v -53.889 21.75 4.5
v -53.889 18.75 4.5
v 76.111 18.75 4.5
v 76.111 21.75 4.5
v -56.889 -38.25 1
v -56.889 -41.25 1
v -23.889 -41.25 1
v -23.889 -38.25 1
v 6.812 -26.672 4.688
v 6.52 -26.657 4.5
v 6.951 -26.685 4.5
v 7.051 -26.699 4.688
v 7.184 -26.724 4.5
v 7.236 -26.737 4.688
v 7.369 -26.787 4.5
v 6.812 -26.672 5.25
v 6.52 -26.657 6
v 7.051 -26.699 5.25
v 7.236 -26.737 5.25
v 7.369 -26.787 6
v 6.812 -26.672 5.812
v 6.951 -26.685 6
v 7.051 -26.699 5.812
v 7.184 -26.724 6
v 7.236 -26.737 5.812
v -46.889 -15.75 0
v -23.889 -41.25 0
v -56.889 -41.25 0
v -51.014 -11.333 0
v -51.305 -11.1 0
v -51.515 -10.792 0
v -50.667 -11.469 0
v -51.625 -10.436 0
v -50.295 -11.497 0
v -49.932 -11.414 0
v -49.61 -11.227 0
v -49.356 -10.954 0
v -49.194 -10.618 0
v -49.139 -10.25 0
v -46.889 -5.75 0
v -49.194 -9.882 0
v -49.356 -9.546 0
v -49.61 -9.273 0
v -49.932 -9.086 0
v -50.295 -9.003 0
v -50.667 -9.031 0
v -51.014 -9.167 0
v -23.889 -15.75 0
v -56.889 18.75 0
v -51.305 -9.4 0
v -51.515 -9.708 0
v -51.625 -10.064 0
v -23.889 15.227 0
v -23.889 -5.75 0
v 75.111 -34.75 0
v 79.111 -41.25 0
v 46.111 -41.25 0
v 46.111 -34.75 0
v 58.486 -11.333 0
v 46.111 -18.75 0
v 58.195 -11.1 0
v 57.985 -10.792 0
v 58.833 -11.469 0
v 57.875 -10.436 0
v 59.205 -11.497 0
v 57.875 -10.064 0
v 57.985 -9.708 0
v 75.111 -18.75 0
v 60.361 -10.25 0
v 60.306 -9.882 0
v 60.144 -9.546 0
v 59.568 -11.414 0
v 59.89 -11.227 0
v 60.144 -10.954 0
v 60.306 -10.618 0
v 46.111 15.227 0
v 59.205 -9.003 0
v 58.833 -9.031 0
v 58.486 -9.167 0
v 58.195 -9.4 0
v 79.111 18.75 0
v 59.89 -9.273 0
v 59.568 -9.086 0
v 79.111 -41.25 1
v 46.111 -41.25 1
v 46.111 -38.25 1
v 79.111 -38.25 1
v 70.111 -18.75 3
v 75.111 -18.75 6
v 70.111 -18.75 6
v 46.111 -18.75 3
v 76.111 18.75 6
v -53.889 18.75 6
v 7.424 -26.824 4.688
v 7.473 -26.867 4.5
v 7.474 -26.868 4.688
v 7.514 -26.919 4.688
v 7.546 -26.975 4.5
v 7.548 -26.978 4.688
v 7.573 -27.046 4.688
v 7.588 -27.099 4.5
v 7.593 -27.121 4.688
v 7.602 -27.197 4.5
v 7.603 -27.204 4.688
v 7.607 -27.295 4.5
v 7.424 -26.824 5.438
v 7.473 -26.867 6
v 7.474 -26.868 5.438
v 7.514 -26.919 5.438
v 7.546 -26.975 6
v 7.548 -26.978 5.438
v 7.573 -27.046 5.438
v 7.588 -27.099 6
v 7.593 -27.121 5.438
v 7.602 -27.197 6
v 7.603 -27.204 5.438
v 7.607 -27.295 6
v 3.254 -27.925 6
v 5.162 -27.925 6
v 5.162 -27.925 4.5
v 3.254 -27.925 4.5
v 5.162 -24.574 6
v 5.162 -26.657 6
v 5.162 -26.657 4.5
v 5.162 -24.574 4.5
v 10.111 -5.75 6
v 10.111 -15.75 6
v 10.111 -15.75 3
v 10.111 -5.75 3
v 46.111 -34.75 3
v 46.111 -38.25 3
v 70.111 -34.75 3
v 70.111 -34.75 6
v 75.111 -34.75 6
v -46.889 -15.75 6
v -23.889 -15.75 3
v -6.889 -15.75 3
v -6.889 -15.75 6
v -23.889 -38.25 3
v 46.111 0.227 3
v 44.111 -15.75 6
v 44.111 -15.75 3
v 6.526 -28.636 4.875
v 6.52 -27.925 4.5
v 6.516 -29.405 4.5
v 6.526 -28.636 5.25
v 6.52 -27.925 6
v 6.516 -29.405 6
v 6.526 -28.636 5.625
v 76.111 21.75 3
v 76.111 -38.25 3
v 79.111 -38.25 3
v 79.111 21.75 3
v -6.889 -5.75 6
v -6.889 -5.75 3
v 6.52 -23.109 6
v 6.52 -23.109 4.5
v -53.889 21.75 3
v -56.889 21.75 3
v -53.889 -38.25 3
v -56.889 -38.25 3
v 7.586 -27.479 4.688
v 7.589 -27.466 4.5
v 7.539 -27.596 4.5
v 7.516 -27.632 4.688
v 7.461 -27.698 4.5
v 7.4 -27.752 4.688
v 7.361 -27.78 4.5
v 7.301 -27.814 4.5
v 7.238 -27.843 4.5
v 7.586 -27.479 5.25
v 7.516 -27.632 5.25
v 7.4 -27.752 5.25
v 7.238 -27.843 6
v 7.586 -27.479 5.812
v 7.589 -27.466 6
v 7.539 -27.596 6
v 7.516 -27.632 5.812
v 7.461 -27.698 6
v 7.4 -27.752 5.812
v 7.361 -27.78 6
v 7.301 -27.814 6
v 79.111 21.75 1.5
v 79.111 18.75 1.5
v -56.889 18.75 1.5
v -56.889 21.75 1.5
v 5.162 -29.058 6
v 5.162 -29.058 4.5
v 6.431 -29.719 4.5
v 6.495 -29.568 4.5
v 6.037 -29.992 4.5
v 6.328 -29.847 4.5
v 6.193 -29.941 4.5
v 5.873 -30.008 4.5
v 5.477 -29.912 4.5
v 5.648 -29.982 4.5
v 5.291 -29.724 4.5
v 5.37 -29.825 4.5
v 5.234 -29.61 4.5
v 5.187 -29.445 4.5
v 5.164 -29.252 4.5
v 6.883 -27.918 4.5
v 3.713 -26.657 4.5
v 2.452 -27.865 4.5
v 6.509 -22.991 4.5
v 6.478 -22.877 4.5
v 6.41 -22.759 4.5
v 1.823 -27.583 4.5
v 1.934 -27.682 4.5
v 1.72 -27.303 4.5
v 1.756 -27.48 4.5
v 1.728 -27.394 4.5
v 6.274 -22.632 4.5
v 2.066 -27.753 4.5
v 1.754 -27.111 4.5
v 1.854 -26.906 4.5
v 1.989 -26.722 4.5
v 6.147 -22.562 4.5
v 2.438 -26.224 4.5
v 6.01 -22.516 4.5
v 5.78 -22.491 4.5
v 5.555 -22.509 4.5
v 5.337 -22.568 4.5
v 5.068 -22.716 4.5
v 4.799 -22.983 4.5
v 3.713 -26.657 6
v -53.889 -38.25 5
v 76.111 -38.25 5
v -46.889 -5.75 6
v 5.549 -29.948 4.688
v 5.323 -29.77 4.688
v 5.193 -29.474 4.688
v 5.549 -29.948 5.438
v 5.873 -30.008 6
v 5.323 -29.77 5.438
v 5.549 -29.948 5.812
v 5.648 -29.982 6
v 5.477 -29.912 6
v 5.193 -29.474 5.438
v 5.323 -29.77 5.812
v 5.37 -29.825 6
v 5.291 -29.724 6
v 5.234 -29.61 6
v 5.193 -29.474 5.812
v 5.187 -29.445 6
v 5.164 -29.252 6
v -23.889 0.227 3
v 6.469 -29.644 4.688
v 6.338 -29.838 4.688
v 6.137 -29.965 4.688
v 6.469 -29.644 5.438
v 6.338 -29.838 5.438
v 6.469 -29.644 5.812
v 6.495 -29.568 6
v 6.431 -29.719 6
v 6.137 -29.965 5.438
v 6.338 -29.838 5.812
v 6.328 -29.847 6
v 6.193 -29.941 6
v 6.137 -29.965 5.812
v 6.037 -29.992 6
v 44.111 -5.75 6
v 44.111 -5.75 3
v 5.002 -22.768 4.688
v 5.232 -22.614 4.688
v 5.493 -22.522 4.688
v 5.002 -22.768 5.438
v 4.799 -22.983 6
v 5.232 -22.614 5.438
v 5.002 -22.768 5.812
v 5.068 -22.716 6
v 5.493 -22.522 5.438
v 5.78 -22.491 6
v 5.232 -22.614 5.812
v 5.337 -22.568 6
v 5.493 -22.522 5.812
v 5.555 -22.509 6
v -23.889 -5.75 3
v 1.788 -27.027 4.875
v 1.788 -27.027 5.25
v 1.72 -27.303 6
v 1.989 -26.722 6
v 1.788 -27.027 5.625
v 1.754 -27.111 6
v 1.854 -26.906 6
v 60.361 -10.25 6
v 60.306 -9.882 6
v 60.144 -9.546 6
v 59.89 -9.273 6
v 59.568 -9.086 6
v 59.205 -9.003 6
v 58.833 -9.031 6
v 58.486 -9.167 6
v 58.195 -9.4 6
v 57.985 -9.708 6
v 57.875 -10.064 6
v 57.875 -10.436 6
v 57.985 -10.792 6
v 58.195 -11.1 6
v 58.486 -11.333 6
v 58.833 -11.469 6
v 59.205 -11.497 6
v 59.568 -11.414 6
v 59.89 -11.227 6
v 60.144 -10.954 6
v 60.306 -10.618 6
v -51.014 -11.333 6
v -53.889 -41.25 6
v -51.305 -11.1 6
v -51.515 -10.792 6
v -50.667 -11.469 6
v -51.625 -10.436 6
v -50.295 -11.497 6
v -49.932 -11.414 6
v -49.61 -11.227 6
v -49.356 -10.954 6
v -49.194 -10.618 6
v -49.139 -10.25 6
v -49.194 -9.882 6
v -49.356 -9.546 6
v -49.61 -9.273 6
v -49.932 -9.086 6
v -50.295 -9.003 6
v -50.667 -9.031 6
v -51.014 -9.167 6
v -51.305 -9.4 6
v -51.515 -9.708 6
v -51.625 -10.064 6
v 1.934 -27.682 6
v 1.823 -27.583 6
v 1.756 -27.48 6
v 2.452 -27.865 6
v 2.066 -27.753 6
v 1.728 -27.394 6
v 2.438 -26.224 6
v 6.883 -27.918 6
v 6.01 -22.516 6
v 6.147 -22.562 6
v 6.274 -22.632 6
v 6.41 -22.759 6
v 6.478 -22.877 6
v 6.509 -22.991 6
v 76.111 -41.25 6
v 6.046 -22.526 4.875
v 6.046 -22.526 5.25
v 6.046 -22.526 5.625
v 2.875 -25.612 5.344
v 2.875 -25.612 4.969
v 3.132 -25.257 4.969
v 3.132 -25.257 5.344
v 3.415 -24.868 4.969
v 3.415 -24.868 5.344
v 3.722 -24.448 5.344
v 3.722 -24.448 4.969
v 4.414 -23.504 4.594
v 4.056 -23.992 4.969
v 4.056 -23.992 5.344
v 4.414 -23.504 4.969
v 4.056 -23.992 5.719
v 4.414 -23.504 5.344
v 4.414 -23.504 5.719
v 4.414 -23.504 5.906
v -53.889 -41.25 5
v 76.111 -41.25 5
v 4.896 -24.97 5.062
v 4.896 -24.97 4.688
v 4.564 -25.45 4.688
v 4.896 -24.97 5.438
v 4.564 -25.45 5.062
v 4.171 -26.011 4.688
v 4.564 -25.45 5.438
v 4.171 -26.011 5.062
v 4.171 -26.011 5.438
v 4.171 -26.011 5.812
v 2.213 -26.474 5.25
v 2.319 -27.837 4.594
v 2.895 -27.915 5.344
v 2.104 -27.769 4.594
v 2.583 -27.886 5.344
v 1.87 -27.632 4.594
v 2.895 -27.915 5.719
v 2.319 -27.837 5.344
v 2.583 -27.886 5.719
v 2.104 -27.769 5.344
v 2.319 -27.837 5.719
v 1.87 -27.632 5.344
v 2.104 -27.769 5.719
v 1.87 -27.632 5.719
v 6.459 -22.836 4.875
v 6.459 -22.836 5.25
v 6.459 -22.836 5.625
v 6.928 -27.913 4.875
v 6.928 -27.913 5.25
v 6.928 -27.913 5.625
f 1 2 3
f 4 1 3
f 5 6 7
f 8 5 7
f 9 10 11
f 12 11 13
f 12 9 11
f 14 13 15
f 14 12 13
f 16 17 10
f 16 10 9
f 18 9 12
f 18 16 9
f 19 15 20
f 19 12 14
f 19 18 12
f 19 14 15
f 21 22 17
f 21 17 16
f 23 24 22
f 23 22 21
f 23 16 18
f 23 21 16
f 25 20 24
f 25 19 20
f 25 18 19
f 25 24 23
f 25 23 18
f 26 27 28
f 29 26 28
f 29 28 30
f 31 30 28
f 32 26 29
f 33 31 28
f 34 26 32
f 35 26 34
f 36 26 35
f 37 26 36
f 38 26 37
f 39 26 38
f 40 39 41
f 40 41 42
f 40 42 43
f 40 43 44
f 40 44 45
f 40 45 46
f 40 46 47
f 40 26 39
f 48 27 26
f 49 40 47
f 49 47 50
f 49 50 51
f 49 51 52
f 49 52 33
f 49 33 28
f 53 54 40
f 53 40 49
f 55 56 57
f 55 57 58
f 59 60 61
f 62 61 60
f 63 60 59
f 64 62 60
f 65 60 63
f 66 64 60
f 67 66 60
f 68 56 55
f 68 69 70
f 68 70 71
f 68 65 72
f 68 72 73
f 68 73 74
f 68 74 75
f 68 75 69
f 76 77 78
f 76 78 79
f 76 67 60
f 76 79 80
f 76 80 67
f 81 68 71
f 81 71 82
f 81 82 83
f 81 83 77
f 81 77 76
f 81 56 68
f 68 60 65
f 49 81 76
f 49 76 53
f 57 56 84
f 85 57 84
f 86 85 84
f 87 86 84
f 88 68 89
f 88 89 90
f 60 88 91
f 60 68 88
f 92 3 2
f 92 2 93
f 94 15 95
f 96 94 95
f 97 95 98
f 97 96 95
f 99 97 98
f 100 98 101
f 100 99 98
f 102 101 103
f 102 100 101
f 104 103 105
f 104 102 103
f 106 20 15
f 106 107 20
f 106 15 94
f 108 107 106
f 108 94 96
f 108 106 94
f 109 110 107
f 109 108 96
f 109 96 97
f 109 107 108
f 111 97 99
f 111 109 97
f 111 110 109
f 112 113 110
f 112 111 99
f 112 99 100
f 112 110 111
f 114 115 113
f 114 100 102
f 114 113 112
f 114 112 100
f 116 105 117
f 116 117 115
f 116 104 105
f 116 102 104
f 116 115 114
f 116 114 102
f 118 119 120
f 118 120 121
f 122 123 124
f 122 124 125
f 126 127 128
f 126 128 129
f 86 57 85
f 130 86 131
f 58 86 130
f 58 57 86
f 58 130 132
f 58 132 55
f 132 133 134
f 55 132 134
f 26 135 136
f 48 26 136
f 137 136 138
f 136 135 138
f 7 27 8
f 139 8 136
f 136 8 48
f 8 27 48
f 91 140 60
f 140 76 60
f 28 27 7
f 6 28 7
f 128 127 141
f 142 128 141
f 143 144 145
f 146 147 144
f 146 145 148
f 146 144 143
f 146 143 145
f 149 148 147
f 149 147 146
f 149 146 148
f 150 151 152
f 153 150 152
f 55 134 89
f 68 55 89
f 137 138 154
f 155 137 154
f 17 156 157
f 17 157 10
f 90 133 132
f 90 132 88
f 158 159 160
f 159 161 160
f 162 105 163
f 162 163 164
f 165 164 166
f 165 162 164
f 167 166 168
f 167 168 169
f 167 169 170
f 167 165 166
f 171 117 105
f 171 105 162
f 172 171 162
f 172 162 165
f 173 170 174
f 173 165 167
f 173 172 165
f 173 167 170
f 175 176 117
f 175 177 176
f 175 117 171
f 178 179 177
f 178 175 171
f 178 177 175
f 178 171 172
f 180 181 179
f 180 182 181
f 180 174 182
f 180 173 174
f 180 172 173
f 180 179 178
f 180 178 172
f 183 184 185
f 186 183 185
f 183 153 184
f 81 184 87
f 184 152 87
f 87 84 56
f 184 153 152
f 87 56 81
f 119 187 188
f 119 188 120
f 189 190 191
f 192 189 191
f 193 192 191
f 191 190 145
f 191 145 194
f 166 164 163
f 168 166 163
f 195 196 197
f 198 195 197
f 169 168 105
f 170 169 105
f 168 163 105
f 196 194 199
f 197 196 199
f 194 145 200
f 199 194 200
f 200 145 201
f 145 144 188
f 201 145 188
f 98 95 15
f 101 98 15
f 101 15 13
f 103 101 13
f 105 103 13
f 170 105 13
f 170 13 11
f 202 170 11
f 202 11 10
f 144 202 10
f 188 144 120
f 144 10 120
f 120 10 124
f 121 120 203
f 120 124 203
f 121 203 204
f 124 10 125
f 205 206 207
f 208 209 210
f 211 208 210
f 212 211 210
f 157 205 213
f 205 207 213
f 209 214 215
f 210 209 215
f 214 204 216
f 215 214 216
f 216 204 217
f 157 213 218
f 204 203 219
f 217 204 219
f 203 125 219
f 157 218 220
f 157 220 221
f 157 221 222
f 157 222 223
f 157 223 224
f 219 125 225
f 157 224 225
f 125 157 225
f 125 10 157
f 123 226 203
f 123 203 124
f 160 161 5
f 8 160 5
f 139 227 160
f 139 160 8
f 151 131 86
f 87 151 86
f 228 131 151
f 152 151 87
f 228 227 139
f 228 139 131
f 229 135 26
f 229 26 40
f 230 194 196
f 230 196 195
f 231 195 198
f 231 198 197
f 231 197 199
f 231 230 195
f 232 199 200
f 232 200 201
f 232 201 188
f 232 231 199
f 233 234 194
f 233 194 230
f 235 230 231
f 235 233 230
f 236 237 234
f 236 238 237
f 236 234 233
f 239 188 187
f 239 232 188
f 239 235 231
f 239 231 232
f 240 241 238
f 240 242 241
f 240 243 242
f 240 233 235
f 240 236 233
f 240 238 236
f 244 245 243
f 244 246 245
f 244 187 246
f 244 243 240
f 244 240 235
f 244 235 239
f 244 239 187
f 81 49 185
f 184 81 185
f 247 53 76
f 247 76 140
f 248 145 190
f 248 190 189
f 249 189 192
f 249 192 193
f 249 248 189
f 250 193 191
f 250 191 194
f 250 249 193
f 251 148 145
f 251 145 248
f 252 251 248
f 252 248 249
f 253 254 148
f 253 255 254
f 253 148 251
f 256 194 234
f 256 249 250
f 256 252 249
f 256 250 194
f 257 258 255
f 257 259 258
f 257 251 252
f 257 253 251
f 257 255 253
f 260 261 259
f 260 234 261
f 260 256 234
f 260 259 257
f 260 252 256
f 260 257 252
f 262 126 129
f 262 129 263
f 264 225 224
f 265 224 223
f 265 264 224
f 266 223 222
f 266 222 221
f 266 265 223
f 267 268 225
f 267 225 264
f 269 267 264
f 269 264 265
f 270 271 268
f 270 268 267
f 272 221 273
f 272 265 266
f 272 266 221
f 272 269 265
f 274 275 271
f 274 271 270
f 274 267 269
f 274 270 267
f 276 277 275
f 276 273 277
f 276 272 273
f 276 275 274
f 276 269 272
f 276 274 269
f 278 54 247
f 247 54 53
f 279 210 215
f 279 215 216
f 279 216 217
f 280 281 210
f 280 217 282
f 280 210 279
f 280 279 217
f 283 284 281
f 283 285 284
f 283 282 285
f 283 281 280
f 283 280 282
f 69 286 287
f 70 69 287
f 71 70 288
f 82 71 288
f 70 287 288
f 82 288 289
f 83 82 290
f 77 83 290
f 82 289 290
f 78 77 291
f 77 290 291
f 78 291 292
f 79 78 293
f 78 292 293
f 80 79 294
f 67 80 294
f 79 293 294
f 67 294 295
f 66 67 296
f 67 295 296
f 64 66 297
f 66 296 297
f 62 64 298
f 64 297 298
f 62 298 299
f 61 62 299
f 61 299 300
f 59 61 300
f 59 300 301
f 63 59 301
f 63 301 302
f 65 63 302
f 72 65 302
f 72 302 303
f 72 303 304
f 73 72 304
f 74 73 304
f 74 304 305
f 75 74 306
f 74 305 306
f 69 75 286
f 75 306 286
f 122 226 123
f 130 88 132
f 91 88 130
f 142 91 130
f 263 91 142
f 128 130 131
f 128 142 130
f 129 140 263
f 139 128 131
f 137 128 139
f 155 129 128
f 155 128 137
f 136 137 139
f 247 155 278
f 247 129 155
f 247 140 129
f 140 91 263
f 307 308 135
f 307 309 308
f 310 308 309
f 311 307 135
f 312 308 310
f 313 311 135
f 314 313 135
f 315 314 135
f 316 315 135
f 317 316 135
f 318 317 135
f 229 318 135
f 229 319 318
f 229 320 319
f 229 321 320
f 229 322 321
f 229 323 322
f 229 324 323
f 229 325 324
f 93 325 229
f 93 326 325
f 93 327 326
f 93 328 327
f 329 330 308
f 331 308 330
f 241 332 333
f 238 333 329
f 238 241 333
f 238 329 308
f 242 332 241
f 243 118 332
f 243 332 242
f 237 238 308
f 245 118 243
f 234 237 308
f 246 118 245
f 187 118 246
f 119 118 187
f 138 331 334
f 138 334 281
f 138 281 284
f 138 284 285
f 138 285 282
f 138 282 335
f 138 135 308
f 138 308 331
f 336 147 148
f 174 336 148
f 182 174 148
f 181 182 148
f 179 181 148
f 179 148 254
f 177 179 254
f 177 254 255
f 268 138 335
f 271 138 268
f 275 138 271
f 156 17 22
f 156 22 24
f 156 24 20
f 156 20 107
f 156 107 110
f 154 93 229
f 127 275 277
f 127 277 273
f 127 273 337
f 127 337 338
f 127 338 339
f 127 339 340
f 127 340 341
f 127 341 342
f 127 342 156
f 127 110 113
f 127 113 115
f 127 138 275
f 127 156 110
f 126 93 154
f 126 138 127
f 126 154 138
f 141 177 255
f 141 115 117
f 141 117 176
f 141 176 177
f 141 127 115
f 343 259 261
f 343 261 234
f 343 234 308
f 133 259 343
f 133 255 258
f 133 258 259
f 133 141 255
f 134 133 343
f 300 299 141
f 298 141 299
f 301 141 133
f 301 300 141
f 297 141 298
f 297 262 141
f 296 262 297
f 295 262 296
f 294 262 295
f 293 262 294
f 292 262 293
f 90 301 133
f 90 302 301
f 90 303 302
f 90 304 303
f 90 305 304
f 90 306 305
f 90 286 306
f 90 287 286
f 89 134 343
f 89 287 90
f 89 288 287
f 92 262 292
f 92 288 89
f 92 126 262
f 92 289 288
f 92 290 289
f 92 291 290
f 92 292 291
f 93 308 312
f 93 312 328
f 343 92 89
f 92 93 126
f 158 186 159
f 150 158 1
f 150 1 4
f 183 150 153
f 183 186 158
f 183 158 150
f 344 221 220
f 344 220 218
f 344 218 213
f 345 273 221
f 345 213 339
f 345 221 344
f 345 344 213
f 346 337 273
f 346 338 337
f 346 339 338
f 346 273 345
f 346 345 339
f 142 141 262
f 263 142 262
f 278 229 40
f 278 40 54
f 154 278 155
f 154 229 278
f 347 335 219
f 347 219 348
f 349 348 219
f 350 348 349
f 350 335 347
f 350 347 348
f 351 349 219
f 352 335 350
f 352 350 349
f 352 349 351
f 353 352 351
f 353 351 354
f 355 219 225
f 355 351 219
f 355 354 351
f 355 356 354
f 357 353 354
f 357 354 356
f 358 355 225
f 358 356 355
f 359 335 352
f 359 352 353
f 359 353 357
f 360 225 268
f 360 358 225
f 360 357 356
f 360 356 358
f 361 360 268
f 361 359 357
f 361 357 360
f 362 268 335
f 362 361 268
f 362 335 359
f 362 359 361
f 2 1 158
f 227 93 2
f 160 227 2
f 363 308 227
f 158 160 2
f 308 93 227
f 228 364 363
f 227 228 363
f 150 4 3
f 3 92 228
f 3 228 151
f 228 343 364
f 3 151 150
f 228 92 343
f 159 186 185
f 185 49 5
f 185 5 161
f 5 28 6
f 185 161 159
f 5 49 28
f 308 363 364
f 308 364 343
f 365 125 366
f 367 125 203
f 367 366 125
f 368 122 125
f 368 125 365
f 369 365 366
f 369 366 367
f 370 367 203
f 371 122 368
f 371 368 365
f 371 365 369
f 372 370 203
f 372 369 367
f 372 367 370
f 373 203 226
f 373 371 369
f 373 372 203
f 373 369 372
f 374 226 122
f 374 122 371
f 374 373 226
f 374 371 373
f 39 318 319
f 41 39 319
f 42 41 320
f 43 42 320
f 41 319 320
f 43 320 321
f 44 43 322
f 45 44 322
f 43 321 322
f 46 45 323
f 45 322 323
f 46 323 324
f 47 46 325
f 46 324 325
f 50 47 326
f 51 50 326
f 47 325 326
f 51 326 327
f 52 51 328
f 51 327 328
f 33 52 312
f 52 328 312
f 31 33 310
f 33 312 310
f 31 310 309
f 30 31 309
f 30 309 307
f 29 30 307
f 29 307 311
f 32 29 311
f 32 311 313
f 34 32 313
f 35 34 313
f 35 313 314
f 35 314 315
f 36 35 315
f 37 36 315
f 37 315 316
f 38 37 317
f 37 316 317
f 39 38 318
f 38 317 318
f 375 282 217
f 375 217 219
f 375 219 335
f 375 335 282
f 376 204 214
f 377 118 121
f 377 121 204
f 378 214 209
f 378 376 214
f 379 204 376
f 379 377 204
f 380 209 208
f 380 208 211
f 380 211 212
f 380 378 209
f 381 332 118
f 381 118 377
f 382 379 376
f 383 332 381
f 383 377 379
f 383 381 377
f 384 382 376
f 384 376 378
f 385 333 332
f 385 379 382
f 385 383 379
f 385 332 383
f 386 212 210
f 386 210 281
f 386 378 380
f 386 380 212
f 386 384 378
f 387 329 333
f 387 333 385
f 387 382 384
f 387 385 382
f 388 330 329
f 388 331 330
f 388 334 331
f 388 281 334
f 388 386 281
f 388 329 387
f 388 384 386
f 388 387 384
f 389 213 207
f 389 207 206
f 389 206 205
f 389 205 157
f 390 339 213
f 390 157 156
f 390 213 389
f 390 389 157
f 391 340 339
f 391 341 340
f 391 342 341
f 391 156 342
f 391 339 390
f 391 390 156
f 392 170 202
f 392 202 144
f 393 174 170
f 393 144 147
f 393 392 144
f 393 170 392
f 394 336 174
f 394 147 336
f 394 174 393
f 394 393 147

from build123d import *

# Parameters (mm, degrees)
SKETCH_1_W           = 130
SKETCH_1_H           = 60
EXTRUDE_1_DEPTH      = 6
EXTRUDE_2_DEPTH      = 3
EXTRUDE_2_DEPTH_BACK = 133
SKETCH_2_W           = 3
SKETCH_2_H           = 60
SKETCH_3_R           = 1.25
SKETCH_3_W           = 5
SKETCH_3_H           = 16
SKETCH_3_W_2         = 40
SKETCH_3_H_2         = 10
SKETCH_3_W_3         = 34
CUT_EXTRUDE_1_DEPTH  = 6
CUT_EXTRUDE_2_DEPTH  = 1.5
SKETCH_5_W           = 70
SKETCH_5_H           = 41.476582403
SKETCH_5_W_2         = 24
SKETCH_5_H_2         = 16
CUT_EXTRUDE_3_DEPTH  = 3
CHAMFER_1_SIZE       = 15
CHAMFER_1_SIZE_2     = 3
CUT_EXTRUDE_4_DEPTH  = 3
SKETCH_7_W           = 130
SKETCH_7_H           = 1.5
EXTRUDE_3_DEPTH      = 3


with BuildPart() as part:
    # 草圖1 → 填料-伸長1 (new body)
    with BuildSketch(Plane.XY):
        with Locations((11.111111111, -11.25)):
            Rectangle(SKETCH_1_W, SKETCH_1_H)
    extrude(amount=EXTRUDE_1_DEPTH)

    # 草圖2 → 填料-伸長2 (add, two sides: drawn at the far end of the back side and taken through both)
    with BuildSketch(Plane.ZY.offset(53.888888889).offset(-EXTRUDE_2_DEPTH_BACK)):
        with Locations((1.5, -11.25)):
            Rectangle(SKETCH_2_W, SKETCH_2_H)
    extrude(amount=EXTRUDE_2_DEPTH + EXTRUDE_2_DEPTH_BACK)

    # 草圖3 → 除料-伸長1 (cut)
    with BuildSketch(Plane.XY.offset(6)):
        with Locations((59.111111111, -10.25)):
            Circle(SKETCH_3_R)
        with Locations((-50.388888889, -10.25)):
            Circle(SKETCH_3_R)
        with Locations((72.611111111, -26.75)):
            Rectangle(SKETCH_3_W, SKETCH_3_H)
        with Locations((-26.888888889, -10.75)):
            Rectangle(SKETCH_3_W_2, SKETCH_3_H_2)
        with Locations((27.111111111, -10.75)):
            Rectangle(SKETCH_3_W_3, SKETCH_3_H_2)
    extrude(amount=-CUT_EXTRUDE_1_DEPTH, mode=Mode.SUBTRACT)

    # 草圖4 → 除料-伸長2 (cut)
    with BuildSketch(Plane.XY.offset(6)):
        with BuildLine():
            Line((5.161633763, -27.924686511), (3.254050898, -27.924686511))
            add(Edge.make_bspline(
                [(3.254050898, -27.924686511), (3.192249579, -27.924078509), (3.072379909, -27.922899232), (2.898729115, -27.915701709), (2.736761533, -27.904944526), (2.586564336, -27.888174414), (2.448251756, -27.865582926), (2.322097886, -27.838909636), (2.207853822, -27.808266207), (2.105836262, -27.771295953), (2.01510686, -27.730787239), (1.936069122, -27.68581143), (1.86982721, -27.634270004), (1.815766676, -27.57730265), (1.772168095, -27.516260775), (1.742170993, -27.449388735), (1.72280295, -27.378127045), (1.720982885, -27.328575874), (1.72005993, -27.303448471)],
                knots=[0, 0, 0, 0, 1.637449122, 3.175991815, 4.604285445, 5.937552174, 7.178588142, 8.315988927, 9.352959284, 10.309701018, 11.187868748, 11.983148269, 12.713194599, 13.402748524, 14.058038132, 14.690029686, 15.335713943, 16, 16, 16, 16], degree=3))
            add(Edge.make_bspline(
                [(1.72005993, -27.303448471), (1.723635689, -27.258199951), (1.731180344, -27.162728075), (1.787663263, -27.019644469), (1.87219849, -26.869087652), (1.94824443, -26.77316), (1.988932886, -26.721833814)],
                knots=[0, 0, 0, 0, 0.830703556, 1.752738595, 2.797600559, 4, 4, 4, 4], degree=3))
            add(Edge.make_bspline(
                [(1.988932886, -26.721833814), (2.063514276, -26.639331654), (2.213358857, -26.473573125), (2.362577426, -26.307250824), (2.437526185, -26.223711286)],
                knots=[0, 0, 0, 0, 0.995449954, 2, 2, 2, 2], degree=3))
            add(Edge.make_bspline(
                [(2.437526185, -26.223711286), (2.47103383, -26.177024109), (2.540031377, -26.080887817), (2.64617827, -25.932308493), (2.757969515, -25.7748922), (2.87632458, -25.60941735), (3.003450981, -25.437027126), (3.133736422, -25.254119028), (3.273689868, -25.064815864), (3.417008587, -24.865483968), (3.567026655, -24.658540826), (3.724948502, -24.444530992), (3.888719581, -24.221478696), (4.058065694, -23.989527198), (4.234458829, -23.749756028), (4.416012984, -23.500904526), (4.606300307, -23.245131026), (4.734336909, -23.071345188), (4.799362833, -22.983084609)],
                knots=[0, 0, 0, 0, 0.68787784, 1.416449417, 2.185717103, 2.998962895, 3.851631247, 4.749555124, 5.686911444, 6.669516273, 7.688234189, 8.746402434, 9.853137794, 11.000549032, 12.184081851, 13.416182313, 14.687757029, 16, 16, 16, 16], degree=3))
            add(Edge.make_bspline(
                [(4.799362833, -22.983084609), (4.830971294, -22.943553506), (4.892623413, -22.866448317), (4.999342936, -22.767074964), (5.111072502, -22.681126787), (5.230934533, -22.611368569), (5.358194037, -22.556625494), (5.493063713, -22.519613637), (5.634235505, -22.493643771), (5.730861536, -22.49164161), (5.780041561, -22.490622564)],
                knots=[0, 0, 0, 0, 1.06425237, 2.0758181, 3.06095989, 4.026690108, 4.987711416, 5.968488933, 6.966016048, 8, 8, 8, 8], degree=3))
            add(Edge.make_bspline(
                [(5.780041561, -22.490622564), (5.826442291, -22.491944732), (5.916313772, -22.494505581), (6.045628911, -22.523235489), (6.166636791, -22.565562498), (6.23827235, -22.610014837), (6.273918727, -22.632134646)],
                knots=[0, 0, 0, 0, 1.066082933, 2.064847948, 3.037054213, 4, 4, 4, 4], degree=3))
            add(Edge.make_bspline(
                [(6.273918727, -22.632134646), (6.311441096, -22.661555246), (6.384541176, -22.718871676), (6.465186438, -22.833465288), (6.511587665, -22.966478607), (6.517237732, -23.060547629), (6.52014975, -23.109030362)],
                knots=[0, 0, 0, 0, 1.018925786, 1.985044098, 2.961501162, 4, 4, 4, 4], degree=3))
            Line((6.52014975, -23.109030362), (6.52014975, -26.656738256))
            add(Edge.make_bspline(
                [(6.52014975, -26.656738256), (6.571120358, -26.658160603), (6.668428141, -26.660876), (6.807468472, -26.672045587), (6.933741535, -26.681782224), (7.04627481, -26.698396225), (7.146439706, -26.713806583), (7.232355911, -26.736203852), (7.306925886, -26.756584321), (7.349633605, -26.777387591), (7.369222241, -26.786929372)],
                knots=[0, 0, 0, 0, 1.415561033, 2.70244186, 3.872869685, 4.930574004, 5.860813375, 6.683597148, 7.396208987, 8, 8, 8, 8], degree=3))
            add(Edge.make_bspline(
                [(7.369222241, -26.786929372), (7.387933285, -26.798727315), (7.425308471, -26.82229363), (7.475291838, -26.865642335), (7.515332971, -26.918922636), (7.550217281, -26.978243638), (7.574189335, -27.047295447), (7.595611952, -27.122551217), (7.603742149, -27.206589411), (7.605862425, -27.264770318), (7.606962539, -27.294957746)],
                knots=[0, 0, 0, 0, 0.898852474, 1.795451925, 2.670043032, 3.597686986, 4.580760669, 5.631985542, 6.771344949, 8, 8, 8, 8], degree=3))
            add(Edge.make_bspline(
                [(7.606962539, -27.294957746), (7.6065918, -27.327130489), (7.605877096, -27.389152557), (7.587829145, -27.478153146), (7.560306222, -27.5599435), (7.518416649, -27.632950045), (7.464991439, -27.697675729), (7.400296134, -27.754477063), (7.324655873, -27.805253805), (7.267343492, -27.829851085), (7.237616005, -27.842609503)],
                knots=[0, 0, 0, 0, 1.087494211, 2.096452886, 3.061576041, 3.998924861, 4.929714891, 5.891658933, 6.906419893, 8, 8, 8, 8], degree=3))
            add(Edge.make_bspline(
                [(7.237616005, -27.842609503), (7.190336116, -27.858712295), (7.089569557, -27.893031811), (6.919845265, -27.915756431), (6.72799274, -27.93166309), (6.591892116, -27.927094657), (6.52014975, -27.924686511)],
                knots=[0, 0, 0, 0, 0.822901404, 1.753831169, 2.815982903, 4, 4, 4, 4], degree=3))
            add(Edge.make_bspline(
                [(6.52014975, -27.924686511), (6.52249173, -28.040722435), (6.52728009, -28.27796686), (6.525874109, -28.640744347), (6.523902436, -29.018132536), (6.518606285, -29.274244271), (6.515904387, -29.404902888)],
                knots=[0, 0, 0, 0, 0.940774337, 1.923485917, 2.940640271, 4, 4, 4, 4], degree=3))
            add(Edge.make_bspline(
                [(6.515904387, -29.404902888), (6.513253145, -29.446642645), (6.508069894, -29.528245001), (6.47349895, -29.644606371), (6.416416736, -29.749022953), (6.340813008, -29.84091244), (6.245918419, -29.915035809), (6.135823145, -29.970814241), (6.008973806, -30.001054572), (5.919815256, -30.005455315), (5.873439535, -30.007744357)],
                knots=[0, 0, 0, 0, 1.014791907, 1.983945634, 2.923310284, 3.892735559, 4.856647083, 5.831419924, 6.872015472, 8, 8, 8, 8], degree=3))
            add(Edge.make_bspline(
                [(5.873439535, -30.007744357), (5.815037496, -30.005688173), (5.704234702, -30.001787096), (5.550592692, -29.954784505), (5.418967159, -29.880845956), (5.316601579, -29.770806418), (5.237109991, -29.634349624), (5.185909967, -29.467148659), (5.160681119, -29.271746214), (5.161303076, -29.132326216), (5.161633763, -29.058198287)],
                knots=[0, 0, 0, 0, 1.02325021, 1.941353164, 2.796047092, 3.646386069, 4.549425683, 5.551115642, 6.69795776, 8, 8, 8, 8], degree=3))
            Line((5.161633763, -29.058198287), (5.161633763, -27.924686511))
        make_face()
        with BuildLine():
            add(Edge.make_bspline(
                [(5.161633763, -24.57368041), (5.119646014, -24.636412887), (5.031158393, -24.768619255), (4.891120499, -24.978124945), (4.731778952, -25.205824972), (4.560305824, -25.457296058), (4.369434267, -25.726531763), (4.166450797, -26.019598708), (3.9439664, -26.33065406), (3.791254445, -26.545837446), (3.712550044, -26.656738256)],
                knots=[0, 0, 0, 0, 0.713938416, 1.50459871, 2.383225934, 3.342268853, 4.38315458, 5.504445422, 6.71384576, 8, 8, 8, 8], degree=3))
            Line((3.712550044, -26.656738256), (5.161633763, -26.656738256))
            Line((5.161633763, -26.656738256), (5.161633763, -24.57368041))
        make_face(mode=Mode.SUBTRACT)
    extrude(amount=-CUT_EXTRUDE_2_DEPTH, mode=Mode.SUBTRACT)

    # 草圖5 → 除料-伸長3 (cut)
    with BuildSketch(Plane(origin=(0, 0, 0), x_dir=(-1, 0, 0), z_dir=(0, 0, -1))):
        with Locations((-11.111111111, -20.511708798)):
            Rectangle(SKETCH_5_W, SKETCH_5_H)
        with Locations((-58.111111111, -26.75)):
            Rectangle(SKETCH_5_W_2, SKETCH_5_H_2)
    extrude(amount=-CUT_EXTRUDE_3_DEPTH, mode=Mode.SUBTRACT)

    # 導角1
    # the kernel refuses this chamfer: 15, 3 mm, written as the material it takes off along each edge
    with BuildSketch(Plane(origin=(46.111111111, 0.226582403, 0), x_dir=(0, 0.9999715107910818, -0.00754835122404063), z_dir=(-1, 0, 0))) as chamfer_1_piece_1_section:
        Polygon((CHAMFER_1_SIZE * 0.999971510791, -CHAMFER_1_SIZE * 0.00754835122404), (-CHAMFER_1_SIZE_2 * 0.00754835122404, -CHAMFER_1_SIZE_2 * 0.999971510791), (0, 0), align=None)
    chamfer_1_piece_1 = extrude(amount=70, mode=Mode.PRIVATE)
    chamfer_1_piece_1 = split(chamfer_1_piece_1, bisect_by=Plane(origin=(11.111111111, 5.568156657, 3), z_dir=(0, 0, -1)), keep=Keep.TOP, mode=Mode.PRIVATE)
    add(chamfer_1_piece_1, mode=Mode.SUBTRACT)

    # 草圖6 → 除料-伸長4 (cut)
    with BuildSketch(Plane.XZ.offset(41.25)):
        Polygon((-53.888888889, 3), (-23.888888889, 3), (46.111111111, 3), (76.111111111, 3), (76.111111111, 5), (-53.888888889, 5), align=None)
        Polygon((-56.888888889, 3), (-56.888888889, 1), (-23.888888889, 1), (-23.888888889, 3), (-53.888888889, 3), align=None)
        Polygon((46.111111111, 3), (46.111111111, 1), (79.111111111, 1), (79.111111111, 3), (76.111111111, 3), align=None)
    extrude(amount=-CUT_EXTRUDE_4_DEPTH, mode=Mode.SUBTRACT)

    # 草圖7 → 填料-伸長3 (add)
    with BuildSketch(Plane(origin=(0, 18.75, 0), x_dir=(1, 0, 0), z_dir=(0, 1, 0))):
        Polygon((79.111111111, -1.5), (-56.888888889, -1.5), (-56.888888889, -3), (-53.888888889, -3), (76.111111111, -3), (79.111111111, -3), align=None)
        with Locations((11.111111111, -3.75)):
            Rectangle(SKETCH_7_W, SKETCH_7_H)
    extrude(amount=EXTRUDE_3_DEPTH)


solid = part.part
